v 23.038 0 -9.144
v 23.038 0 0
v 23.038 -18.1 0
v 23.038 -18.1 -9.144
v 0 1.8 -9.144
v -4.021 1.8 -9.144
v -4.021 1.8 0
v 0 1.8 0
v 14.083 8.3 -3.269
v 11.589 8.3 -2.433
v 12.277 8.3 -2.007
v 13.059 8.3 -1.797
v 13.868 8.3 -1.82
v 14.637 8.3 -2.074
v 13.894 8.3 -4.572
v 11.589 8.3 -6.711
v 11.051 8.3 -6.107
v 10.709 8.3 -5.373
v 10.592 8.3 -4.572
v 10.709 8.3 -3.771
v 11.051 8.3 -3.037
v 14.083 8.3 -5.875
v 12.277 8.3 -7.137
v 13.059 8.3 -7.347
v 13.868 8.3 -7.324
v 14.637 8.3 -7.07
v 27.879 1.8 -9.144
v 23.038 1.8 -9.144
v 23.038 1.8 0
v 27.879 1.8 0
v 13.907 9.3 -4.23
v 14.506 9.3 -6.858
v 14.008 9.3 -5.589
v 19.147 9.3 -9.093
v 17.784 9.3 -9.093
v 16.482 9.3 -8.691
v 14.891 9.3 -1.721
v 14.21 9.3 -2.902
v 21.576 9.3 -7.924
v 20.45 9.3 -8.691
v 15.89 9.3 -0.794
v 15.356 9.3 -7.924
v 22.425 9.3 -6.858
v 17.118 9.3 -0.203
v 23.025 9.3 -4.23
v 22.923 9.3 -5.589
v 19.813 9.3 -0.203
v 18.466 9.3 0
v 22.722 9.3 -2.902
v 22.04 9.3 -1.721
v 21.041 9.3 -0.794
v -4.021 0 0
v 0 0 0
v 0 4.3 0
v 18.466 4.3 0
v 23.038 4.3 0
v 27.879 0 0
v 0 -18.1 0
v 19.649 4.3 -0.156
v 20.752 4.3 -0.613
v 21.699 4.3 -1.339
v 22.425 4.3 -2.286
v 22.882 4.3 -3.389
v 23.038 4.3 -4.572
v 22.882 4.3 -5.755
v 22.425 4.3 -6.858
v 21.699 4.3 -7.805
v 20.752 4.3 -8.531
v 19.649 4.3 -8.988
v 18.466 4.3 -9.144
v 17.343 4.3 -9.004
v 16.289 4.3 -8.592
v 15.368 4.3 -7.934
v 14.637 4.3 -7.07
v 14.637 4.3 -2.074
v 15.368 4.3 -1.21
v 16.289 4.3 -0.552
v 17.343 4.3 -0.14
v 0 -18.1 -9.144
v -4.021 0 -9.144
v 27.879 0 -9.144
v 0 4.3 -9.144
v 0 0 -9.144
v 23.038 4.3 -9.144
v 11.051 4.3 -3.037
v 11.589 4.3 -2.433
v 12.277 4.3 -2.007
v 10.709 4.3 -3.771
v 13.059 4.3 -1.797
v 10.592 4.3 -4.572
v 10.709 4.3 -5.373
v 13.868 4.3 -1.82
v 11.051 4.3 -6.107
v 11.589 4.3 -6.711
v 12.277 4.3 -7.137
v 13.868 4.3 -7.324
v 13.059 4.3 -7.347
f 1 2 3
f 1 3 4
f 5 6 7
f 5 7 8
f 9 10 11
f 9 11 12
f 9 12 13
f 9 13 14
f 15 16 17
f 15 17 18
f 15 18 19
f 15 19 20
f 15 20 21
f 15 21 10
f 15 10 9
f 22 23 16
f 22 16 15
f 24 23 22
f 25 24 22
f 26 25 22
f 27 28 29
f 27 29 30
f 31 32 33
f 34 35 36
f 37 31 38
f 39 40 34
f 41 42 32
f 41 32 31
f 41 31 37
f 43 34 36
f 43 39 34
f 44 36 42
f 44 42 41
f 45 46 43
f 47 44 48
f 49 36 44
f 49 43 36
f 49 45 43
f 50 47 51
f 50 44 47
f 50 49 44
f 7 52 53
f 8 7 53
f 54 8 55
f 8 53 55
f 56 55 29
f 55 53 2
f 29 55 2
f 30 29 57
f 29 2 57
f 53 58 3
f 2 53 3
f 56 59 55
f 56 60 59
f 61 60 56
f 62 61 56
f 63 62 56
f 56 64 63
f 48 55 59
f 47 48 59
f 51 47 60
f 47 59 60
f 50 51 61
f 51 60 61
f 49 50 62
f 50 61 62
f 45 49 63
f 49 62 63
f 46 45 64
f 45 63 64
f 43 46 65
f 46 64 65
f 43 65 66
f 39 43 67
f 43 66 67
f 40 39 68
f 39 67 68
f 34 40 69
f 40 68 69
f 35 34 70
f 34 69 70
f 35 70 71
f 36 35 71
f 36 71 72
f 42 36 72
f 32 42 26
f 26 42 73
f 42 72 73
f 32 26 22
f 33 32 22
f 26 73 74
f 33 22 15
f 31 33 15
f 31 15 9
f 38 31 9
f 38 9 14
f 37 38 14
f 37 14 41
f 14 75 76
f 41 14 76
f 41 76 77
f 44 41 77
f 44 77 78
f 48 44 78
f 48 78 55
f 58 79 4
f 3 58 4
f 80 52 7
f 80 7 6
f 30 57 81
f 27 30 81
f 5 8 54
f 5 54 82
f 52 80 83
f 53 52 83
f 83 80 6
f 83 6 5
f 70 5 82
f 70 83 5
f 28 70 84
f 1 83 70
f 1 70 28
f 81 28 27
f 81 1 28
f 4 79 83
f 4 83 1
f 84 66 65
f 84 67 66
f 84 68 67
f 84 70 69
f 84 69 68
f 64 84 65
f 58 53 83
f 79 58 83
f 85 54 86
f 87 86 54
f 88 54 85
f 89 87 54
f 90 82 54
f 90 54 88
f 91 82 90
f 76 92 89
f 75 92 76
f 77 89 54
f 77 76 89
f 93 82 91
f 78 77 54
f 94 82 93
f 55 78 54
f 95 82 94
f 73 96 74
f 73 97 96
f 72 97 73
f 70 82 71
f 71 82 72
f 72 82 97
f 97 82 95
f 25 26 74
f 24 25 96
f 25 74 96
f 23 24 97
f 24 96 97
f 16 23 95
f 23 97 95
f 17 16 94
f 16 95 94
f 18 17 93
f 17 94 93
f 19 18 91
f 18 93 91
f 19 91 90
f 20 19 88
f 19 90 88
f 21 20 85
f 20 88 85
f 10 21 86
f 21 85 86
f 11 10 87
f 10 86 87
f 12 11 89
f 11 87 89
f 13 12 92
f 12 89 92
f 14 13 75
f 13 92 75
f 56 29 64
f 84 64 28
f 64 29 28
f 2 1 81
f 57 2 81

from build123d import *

# Parameters (mm, degrees)
SKETCH1_W           = 23.0378
SKETCH1_H           = 9.144
BOSS_EXTRUDE1_DEPTH = 18.1
SKETCH2_W           = 31.9
SKETCH2_H           = 9.144
BOSS_EXTRUDE2_DEPTH = 1.8
SKETCH3_W           = 23.0378
SKETCH3_H           = 9.144
BOSS_EXTRUDE3_DEPTH = 2.5
SKETCH4_R           = 4.572
BOSS_EXTRUDE4_DEPTH = 5
SKETCH5_R           = 2.794
BOSS_EXTRUDE5_DEPTH = 4


with BuildPart() as part:
    # Sketch1 → Boss-Extrude1 (new body)
    with BuildSketch(Plane(origin=(0, 0, 0), x_dir=(1, 0, 0), z_dir=(0, 1, 0))):
        with Locations((11.5189, 4.572)):
            Rectangle(SKETCH1_W, SKETCH1_H)
    extrude(amount=-BOSS_EXTRUDE1_DEPTH)

    # Sketch2 → Boss-Extrude2 (add)
    with BuildSketch(Plane(origin=(0, 0, 0), x_dir=(1, 0, 0), z_dir=(0, 1, 0))):
        with Locations((11.929019777, 4.572)):
            Rectangle(SKETCH2_W, SKETCH2_H)
    extrude(amount=BOSS_EXTRUDE2_DEPTH)

    # Sketch3 → Boss-Extrude3 (add)
    with BuildSketch(Plane(origin=(0, 1.8, 0), x_dir=(1, 0, 0), z_dir=(0, 1, 0))):
        with Locations((11.5189, 4.572)):
            Rectangle(SKETCH3_W, SKETCH3_H)
    extrude(amount=BOSS_EXTRUDE3_DEPTH)

    # Sketch4 → Boss-Extrude4 (add)
    with BuildSketch(Plane(origin=(0, 4.3, 0), x_dir=(1, 0, 0), z_dir=(0, 1, 0))):
        with Locations(Location((18.4658, 4.572, 0), (0, 0, 270))):
            Circle(SKETCH4_R)
    extrude(amount=BOSS_EXTRUDE4_DEPTH)

    # Sketch5 → Boss-Extrude5 (add)
    with BuildSketch(Plane(origin=(0, 4.3, 0), x_dir=(1, 0, 0), z_dir=(0, 1, 0))):
        with Locations((13.3858, 4.572)):
            Circle(SKETCH5_R)
    extrude(amount=BOSS_EXTRUDE5_DEPTH)


solid = part.part
